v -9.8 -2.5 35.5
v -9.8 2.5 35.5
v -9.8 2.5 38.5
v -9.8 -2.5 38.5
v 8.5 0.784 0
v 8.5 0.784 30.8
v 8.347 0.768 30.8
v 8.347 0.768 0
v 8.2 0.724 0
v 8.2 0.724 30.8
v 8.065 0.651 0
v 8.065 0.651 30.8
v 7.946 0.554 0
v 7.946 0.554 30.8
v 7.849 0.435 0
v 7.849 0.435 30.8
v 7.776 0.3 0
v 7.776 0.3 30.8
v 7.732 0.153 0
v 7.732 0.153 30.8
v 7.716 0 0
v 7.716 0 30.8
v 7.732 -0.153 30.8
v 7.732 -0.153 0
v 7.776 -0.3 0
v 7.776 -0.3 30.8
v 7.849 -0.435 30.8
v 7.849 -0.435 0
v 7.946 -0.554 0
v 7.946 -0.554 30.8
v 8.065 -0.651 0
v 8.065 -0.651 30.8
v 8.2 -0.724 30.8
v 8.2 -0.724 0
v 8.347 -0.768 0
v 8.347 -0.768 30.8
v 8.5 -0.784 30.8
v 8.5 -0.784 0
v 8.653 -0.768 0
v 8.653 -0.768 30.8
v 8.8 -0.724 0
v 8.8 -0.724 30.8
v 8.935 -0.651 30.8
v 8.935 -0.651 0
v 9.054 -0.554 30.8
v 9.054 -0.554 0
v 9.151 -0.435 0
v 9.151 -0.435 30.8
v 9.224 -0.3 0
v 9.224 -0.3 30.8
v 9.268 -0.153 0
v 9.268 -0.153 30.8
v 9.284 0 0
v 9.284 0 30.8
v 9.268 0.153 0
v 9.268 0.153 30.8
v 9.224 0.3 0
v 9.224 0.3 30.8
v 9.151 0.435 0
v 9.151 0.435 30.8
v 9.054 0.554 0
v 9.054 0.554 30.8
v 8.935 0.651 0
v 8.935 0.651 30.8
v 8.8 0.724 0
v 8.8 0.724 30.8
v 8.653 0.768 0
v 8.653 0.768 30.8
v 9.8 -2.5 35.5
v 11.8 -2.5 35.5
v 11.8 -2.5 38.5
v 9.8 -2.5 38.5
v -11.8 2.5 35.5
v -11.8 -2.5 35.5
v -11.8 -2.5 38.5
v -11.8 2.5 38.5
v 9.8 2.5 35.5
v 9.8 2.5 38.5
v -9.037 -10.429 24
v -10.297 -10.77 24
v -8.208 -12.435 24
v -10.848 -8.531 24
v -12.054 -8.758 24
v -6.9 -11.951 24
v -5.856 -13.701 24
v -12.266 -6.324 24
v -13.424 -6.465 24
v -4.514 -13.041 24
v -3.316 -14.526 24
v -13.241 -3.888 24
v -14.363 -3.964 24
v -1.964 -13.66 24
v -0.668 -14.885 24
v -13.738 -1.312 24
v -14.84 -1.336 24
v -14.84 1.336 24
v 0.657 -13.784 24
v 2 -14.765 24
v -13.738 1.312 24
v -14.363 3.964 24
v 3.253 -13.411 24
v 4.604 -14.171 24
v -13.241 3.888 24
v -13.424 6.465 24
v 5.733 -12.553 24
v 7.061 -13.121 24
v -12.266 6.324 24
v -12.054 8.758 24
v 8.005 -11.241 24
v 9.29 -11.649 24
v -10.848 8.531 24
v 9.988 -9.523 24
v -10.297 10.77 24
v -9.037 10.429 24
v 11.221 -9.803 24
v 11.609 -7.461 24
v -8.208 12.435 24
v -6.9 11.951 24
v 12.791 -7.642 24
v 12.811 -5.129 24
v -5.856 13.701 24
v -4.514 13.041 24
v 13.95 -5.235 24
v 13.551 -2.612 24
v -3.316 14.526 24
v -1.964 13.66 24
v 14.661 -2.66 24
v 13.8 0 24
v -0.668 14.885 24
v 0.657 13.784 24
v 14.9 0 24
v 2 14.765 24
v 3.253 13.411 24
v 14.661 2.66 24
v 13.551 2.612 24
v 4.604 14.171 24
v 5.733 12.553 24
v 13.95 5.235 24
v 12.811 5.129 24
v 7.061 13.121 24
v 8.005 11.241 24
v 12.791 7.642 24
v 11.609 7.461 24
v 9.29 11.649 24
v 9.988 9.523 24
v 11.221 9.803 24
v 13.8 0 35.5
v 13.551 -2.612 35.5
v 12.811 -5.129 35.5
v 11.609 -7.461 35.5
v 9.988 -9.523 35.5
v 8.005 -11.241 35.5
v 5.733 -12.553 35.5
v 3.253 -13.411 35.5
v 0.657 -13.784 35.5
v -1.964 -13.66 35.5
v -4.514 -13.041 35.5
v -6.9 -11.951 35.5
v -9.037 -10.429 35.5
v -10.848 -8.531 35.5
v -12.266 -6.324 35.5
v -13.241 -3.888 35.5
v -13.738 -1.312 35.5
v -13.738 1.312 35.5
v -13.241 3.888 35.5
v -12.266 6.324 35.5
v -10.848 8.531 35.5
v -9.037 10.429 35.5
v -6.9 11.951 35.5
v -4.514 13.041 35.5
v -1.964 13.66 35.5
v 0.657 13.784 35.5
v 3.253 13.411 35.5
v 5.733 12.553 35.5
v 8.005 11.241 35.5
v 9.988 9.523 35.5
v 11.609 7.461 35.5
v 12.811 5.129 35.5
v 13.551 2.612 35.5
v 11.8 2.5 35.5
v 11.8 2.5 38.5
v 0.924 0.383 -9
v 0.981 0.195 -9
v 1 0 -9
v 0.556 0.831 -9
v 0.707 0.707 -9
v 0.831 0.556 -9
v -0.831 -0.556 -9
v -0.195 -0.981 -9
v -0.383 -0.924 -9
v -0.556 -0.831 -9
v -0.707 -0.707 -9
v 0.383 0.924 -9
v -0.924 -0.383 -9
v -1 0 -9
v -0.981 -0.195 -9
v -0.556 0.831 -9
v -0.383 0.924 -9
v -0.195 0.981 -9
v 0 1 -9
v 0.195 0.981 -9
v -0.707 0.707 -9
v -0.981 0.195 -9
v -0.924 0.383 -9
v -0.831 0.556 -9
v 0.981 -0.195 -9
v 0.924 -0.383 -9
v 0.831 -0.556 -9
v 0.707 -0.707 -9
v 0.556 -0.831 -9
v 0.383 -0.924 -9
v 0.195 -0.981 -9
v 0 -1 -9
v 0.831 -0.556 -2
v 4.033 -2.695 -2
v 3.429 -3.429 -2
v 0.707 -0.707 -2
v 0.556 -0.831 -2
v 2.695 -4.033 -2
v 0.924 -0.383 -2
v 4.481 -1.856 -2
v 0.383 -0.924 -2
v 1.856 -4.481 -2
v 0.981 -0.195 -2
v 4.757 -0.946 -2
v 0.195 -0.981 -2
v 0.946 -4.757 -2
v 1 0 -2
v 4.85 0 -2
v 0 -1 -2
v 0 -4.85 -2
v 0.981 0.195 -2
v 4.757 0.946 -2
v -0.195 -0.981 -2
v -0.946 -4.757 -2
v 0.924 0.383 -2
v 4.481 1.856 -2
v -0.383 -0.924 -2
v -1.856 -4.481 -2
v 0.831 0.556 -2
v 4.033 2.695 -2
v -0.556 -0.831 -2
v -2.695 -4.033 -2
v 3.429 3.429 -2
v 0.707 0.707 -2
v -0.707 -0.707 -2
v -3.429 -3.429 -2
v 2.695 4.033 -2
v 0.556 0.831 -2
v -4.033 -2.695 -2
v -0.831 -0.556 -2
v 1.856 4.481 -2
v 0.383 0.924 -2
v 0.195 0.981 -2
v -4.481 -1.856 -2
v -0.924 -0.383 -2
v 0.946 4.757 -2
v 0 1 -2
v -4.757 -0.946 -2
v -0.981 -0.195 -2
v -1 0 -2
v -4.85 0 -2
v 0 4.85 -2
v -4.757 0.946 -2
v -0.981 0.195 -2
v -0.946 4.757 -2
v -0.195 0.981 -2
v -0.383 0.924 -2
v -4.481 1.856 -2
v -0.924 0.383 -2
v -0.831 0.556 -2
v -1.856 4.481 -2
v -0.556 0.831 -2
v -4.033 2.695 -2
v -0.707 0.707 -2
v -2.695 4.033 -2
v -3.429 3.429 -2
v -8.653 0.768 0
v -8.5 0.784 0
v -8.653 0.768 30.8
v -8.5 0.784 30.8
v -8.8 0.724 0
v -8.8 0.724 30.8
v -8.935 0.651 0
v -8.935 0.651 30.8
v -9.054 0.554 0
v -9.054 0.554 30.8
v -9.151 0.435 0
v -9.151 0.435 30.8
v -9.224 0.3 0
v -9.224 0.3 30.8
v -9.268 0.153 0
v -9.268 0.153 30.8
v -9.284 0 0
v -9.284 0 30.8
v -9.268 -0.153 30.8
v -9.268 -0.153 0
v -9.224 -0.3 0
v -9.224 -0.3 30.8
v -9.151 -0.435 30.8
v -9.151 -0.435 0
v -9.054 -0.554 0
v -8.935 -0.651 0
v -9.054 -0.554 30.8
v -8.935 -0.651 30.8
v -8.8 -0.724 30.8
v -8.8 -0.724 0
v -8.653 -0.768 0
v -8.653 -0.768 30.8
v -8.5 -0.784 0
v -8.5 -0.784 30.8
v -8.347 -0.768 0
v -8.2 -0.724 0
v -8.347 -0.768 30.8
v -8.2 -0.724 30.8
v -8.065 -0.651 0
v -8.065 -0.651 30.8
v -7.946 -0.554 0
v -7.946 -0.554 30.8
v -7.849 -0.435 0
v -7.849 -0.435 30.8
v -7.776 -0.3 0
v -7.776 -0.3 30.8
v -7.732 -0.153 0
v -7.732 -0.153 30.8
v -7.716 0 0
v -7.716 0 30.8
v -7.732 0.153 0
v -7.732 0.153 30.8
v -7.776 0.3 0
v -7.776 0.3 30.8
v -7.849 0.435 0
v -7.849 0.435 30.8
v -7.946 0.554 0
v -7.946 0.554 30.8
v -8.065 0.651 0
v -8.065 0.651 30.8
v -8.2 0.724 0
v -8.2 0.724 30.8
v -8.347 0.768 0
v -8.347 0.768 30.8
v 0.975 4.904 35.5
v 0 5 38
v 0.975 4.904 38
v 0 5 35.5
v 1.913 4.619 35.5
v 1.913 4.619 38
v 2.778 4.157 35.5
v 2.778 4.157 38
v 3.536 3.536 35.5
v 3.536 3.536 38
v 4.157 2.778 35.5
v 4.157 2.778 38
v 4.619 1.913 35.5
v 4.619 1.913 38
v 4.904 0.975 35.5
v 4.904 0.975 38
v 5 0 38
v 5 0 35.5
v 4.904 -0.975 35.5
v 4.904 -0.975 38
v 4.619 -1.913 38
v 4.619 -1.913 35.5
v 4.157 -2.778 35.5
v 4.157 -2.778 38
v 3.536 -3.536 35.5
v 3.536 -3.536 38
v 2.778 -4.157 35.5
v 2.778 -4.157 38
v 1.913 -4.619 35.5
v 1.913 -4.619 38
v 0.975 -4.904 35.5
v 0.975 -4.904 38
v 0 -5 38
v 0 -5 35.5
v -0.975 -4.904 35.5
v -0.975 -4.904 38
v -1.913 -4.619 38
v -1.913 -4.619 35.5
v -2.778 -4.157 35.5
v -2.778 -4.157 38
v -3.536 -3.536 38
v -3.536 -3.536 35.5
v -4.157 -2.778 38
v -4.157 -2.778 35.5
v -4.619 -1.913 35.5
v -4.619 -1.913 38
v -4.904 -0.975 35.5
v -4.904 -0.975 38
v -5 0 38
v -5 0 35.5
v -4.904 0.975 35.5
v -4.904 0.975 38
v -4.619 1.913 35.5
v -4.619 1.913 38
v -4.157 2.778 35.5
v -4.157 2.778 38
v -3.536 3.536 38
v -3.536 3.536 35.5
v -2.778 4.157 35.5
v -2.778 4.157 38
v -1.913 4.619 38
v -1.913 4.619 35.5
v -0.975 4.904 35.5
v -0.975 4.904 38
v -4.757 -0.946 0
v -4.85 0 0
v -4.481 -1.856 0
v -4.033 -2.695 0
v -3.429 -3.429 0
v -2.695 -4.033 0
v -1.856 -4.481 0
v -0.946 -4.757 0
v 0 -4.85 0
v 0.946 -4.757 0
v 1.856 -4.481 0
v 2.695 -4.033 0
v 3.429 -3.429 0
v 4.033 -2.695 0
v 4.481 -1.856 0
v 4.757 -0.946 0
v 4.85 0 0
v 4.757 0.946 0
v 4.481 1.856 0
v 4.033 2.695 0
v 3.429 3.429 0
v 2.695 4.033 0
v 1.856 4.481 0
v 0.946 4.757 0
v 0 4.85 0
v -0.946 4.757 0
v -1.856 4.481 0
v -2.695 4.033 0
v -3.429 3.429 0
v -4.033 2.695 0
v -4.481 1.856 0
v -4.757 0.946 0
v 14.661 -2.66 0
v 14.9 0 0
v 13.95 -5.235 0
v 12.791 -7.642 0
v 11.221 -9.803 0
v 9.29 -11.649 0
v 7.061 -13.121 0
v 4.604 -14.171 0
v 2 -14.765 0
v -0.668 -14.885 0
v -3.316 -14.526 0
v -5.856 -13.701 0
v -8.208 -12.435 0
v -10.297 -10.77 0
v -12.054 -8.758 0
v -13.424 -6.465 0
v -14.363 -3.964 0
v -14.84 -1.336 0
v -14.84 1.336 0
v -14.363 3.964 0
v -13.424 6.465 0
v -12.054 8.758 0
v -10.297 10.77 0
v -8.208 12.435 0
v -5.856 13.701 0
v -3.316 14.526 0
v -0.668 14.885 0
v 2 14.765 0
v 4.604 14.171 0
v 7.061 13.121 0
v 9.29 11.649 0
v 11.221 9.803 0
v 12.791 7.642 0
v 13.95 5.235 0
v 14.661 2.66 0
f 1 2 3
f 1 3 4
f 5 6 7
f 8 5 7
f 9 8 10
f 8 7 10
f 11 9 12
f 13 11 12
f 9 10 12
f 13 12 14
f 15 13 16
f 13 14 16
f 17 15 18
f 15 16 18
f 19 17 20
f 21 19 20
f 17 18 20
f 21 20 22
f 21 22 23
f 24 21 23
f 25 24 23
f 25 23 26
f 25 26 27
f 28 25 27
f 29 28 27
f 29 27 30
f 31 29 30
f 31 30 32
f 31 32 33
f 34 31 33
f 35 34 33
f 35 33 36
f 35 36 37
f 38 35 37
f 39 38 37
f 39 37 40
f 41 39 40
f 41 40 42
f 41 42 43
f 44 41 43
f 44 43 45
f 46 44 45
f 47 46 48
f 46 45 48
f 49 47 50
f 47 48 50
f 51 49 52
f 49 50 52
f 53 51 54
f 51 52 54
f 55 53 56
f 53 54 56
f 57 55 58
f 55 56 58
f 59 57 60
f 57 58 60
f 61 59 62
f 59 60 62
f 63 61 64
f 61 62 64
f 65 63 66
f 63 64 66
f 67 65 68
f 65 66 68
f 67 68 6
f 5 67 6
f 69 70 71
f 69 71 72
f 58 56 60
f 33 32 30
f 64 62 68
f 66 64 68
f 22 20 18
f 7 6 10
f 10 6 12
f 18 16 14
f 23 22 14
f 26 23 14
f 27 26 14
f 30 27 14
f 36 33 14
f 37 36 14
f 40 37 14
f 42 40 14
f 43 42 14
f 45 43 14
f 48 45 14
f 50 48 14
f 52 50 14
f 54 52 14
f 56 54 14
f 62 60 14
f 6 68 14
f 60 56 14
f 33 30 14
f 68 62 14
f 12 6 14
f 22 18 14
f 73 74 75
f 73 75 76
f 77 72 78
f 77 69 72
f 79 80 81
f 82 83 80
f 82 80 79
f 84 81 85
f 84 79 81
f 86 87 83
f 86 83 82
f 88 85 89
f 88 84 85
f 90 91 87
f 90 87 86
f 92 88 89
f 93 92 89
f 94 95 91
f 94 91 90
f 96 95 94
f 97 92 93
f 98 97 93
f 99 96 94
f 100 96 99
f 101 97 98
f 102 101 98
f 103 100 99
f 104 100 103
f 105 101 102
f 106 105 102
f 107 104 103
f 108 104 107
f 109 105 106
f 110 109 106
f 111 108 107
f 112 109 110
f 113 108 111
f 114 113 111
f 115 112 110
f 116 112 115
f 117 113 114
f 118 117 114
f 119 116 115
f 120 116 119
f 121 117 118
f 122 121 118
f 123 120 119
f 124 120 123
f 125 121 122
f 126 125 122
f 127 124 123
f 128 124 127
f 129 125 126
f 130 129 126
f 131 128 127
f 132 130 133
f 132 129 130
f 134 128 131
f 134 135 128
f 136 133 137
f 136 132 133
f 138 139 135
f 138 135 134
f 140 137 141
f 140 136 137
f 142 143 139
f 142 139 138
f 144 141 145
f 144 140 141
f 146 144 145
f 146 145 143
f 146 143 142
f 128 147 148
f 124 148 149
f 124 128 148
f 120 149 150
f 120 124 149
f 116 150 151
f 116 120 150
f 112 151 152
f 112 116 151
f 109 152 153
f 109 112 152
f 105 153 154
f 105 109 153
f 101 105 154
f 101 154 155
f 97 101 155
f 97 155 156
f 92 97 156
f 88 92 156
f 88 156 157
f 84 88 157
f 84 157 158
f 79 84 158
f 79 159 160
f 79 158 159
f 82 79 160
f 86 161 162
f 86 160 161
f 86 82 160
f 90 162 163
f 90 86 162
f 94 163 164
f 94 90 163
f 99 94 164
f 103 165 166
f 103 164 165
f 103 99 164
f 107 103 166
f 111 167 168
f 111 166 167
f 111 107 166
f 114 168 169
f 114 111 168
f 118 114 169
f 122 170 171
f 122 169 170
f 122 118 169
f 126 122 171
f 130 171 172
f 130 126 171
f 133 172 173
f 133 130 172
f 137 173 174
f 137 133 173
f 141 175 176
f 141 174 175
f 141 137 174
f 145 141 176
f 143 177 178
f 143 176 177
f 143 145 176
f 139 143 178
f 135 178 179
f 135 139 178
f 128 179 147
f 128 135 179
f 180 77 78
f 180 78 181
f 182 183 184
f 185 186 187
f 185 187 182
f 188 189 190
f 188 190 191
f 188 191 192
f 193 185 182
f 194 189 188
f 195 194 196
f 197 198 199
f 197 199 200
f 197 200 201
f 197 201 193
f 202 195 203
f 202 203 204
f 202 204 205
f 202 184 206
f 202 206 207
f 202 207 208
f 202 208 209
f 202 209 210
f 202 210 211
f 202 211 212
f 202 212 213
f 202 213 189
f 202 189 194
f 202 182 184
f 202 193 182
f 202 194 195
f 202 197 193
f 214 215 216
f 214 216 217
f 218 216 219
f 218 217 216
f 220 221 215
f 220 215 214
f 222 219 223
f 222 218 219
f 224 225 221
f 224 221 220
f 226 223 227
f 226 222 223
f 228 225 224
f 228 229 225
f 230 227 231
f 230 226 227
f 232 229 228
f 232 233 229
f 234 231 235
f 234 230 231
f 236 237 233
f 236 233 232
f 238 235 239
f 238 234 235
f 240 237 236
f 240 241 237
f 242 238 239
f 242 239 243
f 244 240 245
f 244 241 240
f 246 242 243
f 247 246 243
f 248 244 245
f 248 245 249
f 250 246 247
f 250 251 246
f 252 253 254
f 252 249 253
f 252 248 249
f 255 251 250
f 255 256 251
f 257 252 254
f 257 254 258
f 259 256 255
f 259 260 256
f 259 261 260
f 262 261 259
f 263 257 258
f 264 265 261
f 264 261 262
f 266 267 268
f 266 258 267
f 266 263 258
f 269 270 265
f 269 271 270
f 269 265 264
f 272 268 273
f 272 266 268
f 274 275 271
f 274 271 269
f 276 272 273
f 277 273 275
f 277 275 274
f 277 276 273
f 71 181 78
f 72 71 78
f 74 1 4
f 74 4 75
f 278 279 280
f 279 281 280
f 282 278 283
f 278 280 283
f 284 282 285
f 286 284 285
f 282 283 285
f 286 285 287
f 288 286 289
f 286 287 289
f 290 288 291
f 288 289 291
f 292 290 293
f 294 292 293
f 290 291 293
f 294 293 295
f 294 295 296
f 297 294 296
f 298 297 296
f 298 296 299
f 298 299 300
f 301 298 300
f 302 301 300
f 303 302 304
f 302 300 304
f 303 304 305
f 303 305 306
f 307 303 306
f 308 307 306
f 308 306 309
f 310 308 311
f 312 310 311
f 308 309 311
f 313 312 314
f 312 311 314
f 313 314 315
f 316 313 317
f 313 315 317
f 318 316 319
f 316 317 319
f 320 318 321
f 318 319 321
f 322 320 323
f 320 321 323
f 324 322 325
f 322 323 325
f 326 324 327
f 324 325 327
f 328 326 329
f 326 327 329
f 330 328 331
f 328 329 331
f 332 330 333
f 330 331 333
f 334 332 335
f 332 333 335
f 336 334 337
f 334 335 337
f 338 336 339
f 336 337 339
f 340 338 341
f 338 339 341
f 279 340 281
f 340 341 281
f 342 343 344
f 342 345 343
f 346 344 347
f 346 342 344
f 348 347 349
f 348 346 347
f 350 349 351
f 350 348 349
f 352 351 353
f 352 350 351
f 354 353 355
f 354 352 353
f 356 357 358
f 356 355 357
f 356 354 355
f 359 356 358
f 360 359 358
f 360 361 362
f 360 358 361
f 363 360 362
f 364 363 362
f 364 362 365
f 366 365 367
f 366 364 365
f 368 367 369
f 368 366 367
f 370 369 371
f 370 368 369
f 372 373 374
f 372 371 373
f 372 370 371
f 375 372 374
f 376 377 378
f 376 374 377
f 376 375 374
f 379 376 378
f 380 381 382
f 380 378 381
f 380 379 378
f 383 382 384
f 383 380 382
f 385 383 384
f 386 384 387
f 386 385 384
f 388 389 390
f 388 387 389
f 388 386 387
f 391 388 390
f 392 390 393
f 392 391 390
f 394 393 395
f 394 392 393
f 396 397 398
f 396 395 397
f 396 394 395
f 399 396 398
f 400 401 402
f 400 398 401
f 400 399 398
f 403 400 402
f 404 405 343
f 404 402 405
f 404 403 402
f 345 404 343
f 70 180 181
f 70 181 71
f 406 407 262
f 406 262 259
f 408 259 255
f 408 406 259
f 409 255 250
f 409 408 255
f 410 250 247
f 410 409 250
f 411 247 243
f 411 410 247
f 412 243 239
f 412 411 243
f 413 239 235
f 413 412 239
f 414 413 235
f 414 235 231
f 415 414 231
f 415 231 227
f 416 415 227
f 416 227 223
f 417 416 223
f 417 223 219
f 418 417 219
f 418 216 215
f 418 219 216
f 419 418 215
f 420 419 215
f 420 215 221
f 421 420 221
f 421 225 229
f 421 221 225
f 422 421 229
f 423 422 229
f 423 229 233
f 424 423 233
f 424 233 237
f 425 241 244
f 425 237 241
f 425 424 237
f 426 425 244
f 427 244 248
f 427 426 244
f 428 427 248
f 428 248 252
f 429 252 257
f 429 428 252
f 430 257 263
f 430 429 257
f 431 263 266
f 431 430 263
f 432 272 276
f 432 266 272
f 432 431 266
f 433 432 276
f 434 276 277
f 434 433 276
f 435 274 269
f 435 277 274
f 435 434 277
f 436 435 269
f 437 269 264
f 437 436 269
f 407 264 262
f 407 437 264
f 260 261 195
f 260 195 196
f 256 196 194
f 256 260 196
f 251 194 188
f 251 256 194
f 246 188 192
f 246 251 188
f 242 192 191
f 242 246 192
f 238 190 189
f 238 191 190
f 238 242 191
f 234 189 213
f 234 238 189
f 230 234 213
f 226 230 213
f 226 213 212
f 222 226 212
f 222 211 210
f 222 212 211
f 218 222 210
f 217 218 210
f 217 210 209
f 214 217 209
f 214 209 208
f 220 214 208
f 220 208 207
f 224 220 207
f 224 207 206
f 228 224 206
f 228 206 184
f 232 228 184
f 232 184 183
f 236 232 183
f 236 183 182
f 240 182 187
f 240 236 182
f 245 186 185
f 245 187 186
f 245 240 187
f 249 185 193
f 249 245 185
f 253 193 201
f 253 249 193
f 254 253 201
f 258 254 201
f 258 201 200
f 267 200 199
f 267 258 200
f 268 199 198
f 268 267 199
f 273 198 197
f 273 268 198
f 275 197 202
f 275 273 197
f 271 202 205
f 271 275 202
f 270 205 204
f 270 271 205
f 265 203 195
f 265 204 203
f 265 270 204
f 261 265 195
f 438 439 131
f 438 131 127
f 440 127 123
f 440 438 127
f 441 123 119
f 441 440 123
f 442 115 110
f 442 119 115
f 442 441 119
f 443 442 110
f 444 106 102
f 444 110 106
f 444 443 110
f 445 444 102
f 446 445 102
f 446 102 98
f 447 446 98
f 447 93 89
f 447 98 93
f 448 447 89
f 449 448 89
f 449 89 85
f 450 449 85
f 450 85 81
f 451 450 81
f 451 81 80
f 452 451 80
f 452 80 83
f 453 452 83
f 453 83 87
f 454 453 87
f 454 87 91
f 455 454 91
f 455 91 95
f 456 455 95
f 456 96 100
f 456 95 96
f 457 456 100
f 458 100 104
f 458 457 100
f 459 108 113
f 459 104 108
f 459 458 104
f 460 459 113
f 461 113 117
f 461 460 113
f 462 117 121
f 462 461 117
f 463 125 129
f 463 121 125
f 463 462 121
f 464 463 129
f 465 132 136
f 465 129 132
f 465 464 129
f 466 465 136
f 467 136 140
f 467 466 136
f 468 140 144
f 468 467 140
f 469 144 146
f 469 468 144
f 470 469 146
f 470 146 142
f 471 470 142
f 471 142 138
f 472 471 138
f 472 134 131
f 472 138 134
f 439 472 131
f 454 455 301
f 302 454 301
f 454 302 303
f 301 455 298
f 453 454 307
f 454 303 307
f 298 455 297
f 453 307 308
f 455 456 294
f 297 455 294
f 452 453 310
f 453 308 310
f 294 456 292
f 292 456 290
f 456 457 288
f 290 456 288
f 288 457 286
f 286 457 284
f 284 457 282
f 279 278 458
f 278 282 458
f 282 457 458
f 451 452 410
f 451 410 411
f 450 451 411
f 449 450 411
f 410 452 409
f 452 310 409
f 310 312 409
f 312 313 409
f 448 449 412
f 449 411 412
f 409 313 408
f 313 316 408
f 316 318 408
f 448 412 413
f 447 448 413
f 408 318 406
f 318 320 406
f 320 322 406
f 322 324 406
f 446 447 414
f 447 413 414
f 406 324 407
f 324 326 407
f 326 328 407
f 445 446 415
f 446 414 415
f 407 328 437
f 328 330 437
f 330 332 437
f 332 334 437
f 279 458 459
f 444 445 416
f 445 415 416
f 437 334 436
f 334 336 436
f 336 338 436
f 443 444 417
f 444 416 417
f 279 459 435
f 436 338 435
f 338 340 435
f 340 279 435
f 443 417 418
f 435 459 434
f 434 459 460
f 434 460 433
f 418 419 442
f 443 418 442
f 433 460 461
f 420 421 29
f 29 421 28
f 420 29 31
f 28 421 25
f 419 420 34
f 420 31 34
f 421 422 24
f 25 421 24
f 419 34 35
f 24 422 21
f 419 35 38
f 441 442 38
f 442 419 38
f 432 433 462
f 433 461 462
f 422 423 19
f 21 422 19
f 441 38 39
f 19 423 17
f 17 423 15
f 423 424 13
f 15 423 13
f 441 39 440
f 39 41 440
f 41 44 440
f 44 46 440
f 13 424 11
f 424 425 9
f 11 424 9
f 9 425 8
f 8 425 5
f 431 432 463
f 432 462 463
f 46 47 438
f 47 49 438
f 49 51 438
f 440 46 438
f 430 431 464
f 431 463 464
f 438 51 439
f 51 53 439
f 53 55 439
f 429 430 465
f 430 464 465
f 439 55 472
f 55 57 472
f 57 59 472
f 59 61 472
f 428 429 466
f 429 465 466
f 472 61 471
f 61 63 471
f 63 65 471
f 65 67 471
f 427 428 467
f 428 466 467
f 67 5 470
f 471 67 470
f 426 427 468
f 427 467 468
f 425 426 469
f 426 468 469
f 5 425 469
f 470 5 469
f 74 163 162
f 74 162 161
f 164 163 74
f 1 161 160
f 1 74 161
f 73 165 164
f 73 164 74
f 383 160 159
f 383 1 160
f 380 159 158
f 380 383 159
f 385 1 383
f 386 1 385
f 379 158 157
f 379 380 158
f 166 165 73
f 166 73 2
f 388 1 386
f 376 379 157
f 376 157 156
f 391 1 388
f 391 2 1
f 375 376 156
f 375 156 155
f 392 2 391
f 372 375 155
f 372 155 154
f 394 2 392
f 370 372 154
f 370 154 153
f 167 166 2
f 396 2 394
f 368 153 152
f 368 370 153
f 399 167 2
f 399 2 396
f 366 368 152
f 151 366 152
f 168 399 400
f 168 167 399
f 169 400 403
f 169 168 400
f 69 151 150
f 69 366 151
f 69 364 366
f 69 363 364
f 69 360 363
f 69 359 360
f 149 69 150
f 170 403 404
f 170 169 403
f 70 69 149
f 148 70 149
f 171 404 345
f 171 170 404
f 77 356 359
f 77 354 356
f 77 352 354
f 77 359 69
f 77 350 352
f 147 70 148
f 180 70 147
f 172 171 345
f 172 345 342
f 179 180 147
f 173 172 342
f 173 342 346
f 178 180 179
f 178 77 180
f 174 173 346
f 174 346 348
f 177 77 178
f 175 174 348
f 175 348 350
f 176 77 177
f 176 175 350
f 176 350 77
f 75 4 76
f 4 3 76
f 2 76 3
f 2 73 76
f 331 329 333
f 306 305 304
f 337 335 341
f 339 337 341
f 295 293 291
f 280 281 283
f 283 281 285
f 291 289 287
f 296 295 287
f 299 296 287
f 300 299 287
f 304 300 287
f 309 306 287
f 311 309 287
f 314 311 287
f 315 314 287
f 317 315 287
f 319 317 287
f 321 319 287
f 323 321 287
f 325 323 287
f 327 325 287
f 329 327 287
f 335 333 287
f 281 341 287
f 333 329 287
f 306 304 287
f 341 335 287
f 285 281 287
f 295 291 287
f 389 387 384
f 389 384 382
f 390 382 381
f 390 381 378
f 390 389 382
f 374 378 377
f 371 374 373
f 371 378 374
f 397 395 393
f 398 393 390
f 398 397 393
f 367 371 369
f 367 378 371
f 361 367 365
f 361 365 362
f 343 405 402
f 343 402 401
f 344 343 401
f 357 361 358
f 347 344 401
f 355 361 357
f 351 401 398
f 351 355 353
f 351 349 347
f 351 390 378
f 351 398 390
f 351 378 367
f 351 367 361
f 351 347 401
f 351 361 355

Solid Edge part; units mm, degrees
sketch "Sketch1" plane through (0, 0, 0) normal (0, 0, 1) x (1, 0, 0)
  circle A0 centre (0, 0) radius 13.8
  dimension "D1" = 27.6
extrude "Ajout_matière_1" add sketch "Sketch1" along normal blind 35.5
sketch "Sketch2" plane through (0, 0, 0) normal (0, 0, 1) x (1, 0, 0)
  circle A0 centre (0, 0) radius 14.9
extrude "Ajout_matière_2" add sketch "Sketch2" along normal blind 24
sketch "Sketch3" plane through (0, 0, 0) normal (0, 0, -1) x (-1, 0, 0)
  circle A0 centre (0, 0) radius 4.85
extrude "Ajout_matière_3" add sketch "Sketch3" along normal blind 2
sketch "Sketch4" plane through (0, 0, -2) normal (0, 0, -1) x (-1, 0, 0)
  circle A0 centre (0, 0) radius 1
extrude "Ajout_matière_4" add sketch "Sketch4" along normal blind 7
hole "Perçage_1" at (8.5, 0, 0) direction (0, 0, 1) diameter 1.567 depth 30.8 thread major 2 thread length 2
hole "Hole1" at (-8.5, 0, 0) direction (0, 0, 1) diameter 1.567 depth 30.8 thread major 2 thread length 2
sketch "Sketch5" plane through (0, 0, 35.5) normal (0, 0, 1) x (0, 1, 0)
  circle A0 centre (0, 0) radius 5
extrude "Ajout_matière_5" add sketch "Sketch5" along normal blind 2.5
sketch "Sketch6" plane through (0, 0, 35.5) normal (0, 0, 1) x (-1, 0, 0)
  line L0 (-11.8, 2.5) -> (-9.8, 2.5)
  line L1 (-9.8, 2.5) -> (-9.8, -2.5)
  line L2 (-9.8, -2.5) -> (-11.8, -2.5)
  line L3 (-11.8, -2.5) -> (-11.8, 2.5)
  line L4 (9.8, 2.5) -> (11.8, 2.5)
  line L5 (11.8, 2.5) -> (11.8, -2.5)
  line L6 (11.8, -2.5) -> (9.8, -2.5)
  line L7 (9.8, -2.5) -> (9.8, 2.5)
  dimension "D1" = 5
  dimension "D2" = 2
  dimension "D3" = 2
  dimension "D4" = 5
  dimension "D5" = 2
  dimension "D6" = 2
extrude "Ajout_matière_7" add sketch "Sketch6" along normal blind 3
properties material "Acier S235"
